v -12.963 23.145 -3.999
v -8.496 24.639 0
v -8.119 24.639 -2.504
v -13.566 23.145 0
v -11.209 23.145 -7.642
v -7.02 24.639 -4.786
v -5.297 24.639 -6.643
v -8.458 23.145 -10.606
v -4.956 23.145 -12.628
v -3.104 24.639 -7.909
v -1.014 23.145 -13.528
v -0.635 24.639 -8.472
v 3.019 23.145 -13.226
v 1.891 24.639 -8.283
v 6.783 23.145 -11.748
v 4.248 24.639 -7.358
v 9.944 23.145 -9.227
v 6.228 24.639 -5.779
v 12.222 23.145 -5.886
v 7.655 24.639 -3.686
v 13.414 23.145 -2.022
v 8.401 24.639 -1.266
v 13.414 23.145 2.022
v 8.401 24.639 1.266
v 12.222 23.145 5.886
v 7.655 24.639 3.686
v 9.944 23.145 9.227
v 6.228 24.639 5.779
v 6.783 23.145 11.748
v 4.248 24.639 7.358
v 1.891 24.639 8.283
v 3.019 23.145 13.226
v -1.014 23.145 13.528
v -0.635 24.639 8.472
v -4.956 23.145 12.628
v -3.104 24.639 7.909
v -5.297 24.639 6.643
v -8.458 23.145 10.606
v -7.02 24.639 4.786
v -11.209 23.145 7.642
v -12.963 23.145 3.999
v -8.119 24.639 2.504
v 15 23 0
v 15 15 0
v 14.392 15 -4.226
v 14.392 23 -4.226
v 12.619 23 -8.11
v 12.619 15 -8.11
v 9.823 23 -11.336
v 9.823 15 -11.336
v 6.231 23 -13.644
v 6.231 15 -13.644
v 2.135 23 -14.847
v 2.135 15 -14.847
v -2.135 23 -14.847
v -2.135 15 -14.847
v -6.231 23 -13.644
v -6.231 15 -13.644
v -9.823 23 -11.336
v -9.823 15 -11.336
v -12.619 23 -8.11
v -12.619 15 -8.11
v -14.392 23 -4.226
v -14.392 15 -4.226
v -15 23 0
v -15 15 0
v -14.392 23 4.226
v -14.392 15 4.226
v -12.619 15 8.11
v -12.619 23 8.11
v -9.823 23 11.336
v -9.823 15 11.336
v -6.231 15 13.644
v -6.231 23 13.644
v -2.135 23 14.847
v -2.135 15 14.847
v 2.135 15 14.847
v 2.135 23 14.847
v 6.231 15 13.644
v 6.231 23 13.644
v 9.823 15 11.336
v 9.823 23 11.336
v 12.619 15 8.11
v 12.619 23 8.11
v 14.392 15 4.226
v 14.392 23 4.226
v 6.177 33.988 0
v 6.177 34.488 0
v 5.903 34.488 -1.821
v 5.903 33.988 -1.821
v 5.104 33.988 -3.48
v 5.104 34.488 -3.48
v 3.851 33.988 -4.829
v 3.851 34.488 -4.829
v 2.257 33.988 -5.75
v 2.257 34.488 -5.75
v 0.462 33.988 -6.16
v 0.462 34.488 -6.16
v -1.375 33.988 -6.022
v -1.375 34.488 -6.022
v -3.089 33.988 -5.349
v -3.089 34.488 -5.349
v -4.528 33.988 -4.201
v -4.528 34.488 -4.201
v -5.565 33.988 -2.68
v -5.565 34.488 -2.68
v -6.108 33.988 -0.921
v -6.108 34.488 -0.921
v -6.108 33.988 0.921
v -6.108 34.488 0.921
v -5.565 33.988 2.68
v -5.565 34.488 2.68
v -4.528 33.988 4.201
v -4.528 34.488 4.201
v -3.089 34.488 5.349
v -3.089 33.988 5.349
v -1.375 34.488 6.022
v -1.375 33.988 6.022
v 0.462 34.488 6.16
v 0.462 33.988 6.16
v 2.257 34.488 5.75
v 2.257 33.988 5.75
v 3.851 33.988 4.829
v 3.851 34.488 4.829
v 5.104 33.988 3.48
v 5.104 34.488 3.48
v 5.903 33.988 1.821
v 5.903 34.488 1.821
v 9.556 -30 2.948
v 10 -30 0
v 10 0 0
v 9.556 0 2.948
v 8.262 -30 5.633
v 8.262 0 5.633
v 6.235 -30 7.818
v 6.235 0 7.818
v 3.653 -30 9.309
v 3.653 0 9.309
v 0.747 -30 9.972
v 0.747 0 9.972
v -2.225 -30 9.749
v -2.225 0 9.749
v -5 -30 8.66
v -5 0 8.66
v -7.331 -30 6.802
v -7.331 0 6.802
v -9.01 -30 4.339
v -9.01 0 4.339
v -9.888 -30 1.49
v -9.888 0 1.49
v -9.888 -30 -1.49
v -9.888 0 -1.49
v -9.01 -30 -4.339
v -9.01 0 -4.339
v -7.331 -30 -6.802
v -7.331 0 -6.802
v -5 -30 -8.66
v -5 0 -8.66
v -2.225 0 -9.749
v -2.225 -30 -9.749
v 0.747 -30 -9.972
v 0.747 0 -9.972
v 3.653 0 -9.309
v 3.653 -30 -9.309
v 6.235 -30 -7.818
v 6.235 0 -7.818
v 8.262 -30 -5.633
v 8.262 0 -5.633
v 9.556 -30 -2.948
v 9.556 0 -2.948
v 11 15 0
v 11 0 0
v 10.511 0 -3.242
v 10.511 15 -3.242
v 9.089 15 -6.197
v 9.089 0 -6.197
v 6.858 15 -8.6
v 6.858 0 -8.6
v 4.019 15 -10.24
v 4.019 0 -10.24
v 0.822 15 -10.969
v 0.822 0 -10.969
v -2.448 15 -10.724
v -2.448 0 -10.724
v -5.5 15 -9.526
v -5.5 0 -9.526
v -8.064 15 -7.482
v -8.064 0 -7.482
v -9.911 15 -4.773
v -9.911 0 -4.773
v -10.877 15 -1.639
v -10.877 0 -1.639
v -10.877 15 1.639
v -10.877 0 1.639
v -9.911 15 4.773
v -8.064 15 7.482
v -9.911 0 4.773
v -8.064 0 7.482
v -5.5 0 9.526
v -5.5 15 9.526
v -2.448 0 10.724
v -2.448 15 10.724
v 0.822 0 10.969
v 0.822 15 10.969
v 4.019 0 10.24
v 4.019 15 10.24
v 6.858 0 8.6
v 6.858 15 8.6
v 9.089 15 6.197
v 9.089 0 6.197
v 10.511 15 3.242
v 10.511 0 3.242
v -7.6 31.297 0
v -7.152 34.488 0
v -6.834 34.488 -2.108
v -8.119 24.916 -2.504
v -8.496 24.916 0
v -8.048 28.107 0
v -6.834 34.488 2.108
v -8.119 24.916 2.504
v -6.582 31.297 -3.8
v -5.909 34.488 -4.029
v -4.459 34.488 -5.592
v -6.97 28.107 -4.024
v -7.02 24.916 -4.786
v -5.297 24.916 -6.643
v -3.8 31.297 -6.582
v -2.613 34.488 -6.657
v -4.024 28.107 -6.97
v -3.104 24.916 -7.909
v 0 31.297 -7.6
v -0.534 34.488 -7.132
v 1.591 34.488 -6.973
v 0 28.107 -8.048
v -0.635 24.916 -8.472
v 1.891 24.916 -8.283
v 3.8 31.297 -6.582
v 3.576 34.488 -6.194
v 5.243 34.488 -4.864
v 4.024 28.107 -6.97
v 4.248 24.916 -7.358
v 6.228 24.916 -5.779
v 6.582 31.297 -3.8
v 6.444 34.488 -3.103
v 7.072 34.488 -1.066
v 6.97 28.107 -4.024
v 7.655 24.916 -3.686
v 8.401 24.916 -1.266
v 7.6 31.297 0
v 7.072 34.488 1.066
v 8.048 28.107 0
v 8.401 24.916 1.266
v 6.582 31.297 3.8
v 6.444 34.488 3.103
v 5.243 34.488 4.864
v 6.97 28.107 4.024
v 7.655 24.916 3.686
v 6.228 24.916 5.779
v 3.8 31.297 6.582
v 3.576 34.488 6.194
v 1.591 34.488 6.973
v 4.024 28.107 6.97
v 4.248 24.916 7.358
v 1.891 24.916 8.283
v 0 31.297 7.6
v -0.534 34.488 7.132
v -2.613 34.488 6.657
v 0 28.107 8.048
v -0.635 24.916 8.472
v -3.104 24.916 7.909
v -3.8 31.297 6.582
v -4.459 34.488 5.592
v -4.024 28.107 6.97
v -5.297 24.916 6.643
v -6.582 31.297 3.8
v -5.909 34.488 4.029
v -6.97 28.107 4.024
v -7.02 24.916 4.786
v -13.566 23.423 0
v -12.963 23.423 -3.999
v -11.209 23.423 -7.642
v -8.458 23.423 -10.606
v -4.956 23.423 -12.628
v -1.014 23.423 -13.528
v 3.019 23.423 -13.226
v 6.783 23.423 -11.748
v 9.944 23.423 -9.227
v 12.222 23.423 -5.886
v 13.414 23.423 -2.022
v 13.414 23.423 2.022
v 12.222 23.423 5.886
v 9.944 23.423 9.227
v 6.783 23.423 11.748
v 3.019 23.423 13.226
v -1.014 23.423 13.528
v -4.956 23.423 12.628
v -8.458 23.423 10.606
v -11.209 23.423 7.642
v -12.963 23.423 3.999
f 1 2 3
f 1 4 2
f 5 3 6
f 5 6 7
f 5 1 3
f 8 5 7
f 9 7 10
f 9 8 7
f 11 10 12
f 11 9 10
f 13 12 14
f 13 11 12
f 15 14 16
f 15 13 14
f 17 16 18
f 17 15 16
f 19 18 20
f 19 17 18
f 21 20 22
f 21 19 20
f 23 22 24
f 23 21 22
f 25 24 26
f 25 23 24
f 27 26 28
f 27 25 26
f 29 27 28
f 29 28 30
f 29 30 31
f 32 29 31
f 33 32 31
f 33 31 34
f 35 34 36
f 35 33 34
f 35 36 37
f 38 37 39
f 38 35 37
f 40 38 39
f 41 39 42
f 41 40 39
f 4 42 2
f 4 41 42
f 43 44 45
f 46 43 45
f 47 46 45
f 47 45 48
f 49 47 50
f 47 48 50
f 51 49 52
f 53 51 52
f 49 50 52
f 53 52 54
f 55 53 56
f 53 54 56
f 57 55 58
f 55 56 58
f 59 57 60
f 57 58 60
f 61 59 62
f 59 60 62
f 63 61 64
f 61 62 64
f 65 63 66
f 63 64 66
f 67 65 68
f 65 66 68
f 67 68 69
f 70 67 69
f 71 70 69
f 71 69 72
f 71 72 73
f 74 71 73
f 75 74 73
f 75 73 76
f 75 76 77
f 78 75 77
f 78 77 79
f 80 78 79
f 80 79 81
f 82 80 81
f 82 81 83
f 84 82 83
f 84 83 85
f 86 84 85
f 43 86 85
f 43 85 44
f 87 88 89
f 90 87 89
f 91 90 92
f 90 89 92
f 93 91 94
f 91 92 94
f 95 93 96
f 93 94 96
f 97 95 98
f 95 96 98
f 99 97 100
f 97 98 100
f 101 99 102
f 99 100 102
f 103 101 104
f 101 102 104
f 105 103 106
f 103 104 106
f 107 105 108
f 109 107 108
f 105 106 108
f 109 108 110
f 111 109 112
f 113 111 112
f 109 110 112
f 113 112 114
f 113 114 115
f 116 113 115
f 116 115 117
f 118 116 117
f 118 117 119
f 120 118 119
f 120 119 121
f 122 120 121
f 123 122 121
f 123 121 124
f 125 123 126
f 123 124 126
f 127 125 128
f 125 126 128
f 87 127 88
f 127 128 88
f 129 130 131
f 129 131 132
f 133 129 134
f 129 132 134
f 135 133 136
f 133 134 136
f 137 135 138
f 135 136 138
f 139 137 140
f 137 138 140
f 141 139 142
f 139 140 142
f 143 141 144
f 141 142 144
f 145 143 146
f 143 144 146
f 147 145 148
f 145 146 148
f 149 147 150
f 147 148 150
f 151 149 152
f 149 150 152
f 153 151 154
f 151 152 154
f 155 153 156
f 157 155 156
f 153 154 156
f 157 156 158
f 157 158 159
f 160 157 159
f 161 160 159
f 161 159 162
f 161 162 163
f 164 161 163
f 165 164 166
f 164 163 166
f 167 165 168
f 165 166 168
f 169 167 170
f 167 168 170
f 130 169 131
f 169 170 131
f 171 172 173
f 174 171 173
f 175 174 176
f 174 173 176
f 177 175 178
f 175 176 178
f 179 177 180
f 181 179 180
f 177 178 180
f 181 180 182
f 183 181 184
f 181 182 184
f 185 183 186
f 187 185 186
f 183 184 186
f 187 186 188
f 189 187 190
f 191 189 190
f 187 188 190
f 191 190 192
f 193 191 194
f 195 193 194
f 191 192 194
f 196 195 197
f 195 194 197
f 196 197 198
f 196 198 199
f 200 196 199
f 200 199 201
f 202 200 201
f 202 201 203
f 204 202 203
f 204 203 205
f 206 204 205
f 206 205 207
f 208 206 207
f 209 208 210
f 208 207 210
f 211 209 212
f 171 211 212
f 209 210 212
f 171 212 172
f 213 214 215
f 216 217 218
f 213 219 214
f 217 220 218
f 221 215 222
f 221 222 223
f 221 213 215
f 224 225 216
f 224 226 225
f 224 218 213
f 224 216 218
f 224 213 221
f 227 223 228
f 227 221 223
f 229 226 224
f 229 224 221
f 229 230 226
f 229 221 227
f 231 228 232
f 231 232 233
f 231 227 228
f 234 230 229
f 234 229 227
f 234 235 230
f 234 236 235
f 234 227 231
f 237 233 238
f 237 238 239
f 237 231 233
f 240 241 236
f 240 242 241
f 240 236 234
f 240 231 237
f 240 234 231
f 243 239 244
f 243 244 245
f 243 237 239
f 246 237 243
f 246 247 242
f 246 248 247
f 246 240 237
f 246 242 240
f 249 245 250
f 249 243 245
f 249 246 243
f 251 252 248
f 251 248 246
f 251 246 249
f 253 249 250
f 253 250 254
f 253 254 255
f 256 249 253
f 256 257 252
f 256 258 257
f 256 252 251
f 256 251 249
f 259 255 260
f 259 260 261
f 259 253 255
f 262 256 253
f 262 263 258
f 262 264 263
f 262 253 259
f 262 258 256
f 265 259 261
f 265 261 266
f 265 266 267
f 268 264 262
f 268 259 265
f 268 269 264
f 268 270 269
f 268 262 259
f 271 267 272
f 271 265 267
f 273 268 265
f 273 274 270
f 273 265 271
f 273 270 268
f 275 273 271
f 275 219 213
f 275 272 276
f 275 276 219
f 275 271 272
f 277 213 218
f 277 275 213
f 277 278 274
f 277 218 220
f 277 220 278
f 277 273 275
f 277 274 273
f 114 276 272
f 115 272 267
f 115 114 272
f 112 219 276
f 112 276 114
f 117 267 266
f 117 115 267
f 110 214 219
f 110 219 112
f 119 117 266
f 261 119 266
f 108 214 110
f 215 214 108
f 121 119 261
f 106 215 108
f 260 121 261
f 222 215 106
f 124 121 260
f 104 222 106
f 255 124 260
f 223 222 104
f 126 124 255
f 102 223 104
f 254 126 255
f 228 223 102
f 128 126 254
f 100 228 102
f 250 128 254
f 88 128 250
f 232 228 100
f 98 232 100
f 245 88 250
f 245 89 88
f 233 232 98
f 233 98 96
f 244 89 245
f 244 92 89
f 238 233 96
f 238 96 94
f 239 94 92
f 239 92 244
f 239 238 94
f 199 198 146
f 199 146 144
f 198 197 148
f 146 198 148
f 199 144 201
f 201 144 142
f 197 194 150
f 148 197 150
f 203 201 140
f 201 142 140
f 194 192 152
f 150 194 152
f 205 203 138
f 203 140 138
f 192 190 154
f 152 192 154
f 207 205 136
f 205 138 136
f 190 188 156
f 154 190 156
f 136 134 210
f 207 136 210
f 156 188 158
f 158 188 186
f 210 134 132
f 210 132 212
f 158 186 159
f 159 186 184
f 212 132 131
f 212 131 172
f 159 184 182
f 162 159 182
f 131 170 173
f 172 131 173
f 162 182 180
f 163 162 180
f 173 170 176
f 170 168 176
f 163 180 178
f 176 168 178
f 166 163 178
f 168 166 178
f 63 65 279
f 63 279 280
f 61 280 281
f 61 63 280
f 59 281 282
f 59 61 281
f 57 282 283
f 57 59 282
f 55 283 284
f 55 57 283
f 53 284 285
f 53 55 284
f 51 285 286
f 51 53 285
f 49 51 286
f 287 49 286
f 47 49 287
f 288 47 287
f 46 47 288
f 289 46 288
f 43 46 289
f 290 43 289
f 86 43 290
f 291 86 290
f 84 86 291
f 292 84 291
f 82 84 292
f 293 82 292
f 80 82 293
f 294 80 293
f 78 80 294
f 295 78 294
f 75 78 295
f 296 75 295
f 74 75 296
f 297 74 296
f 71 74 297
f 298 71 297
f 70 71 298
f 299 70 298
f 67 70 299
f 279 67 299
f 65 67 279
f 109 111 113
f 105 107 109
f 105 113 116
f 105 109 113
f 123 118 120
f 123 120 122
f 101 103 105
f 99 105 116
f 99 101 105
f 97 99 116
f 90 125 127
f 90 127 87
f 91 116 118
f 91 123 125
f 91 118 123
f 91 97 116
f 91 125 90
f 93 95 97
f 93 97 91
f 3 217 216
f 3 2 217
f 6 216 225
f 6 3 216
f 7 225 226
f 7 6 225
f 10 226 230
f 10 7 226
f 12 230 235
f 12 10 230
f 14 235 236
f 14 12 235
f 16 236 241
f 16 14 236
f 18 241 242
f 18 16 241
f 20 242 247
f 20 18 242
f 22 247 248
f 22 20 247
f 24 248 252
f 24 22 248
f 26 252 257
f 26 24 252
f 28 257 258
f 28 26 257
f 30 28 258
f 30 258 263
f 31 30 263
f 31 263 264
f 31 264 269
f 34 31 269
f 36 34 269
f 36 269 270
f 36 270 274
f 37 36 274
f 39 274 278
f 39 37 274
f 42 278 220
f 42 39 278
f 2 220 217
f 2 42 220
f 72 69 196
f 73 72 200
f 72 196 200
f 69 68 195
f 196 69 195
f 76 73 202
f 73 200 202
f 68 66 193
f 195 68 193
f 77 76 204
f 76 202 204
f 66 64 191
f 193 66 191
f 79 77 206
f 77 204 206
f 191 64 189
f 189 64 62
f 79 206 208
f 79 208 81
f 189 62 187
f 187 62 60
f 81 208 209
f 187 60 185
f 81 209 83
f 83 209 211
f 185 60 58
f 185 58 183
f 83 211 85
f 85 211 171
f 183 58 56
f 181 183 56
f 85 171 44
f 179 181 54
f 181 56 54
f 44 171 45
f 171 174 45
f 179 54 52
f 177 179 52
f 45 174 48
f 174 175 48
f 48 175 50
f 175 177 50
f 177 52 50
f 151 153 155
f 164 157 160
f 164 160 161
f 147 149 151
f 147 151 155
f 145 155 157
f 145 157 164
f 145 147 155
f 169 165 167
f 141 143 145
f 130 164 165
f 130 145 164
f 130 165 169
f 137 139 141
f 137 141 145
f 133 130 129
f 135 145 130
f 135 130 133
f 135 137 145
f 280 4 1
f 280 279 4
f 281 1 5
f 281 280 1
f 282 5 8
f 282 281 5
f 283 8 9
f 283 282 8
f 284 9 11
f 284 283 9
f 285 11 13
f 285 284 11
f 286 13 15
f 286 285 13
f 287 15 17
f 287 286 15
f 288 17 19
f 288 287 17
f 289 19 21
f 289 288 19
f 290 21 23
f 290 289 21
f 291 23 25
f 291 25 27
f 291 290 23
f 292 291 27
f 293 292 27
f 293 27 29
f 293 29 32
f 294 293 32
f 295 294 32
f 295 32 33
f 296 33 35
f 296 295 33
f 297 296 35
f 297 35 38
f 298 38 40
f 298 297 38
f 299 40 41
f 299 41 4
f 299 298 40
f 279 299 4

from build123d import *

# Parameters (mm, degrees)
SKETCH1_R           = 11
BOSS_EXTRUDE1_DEPTH = 15
SKETCH2_R           = 15
BOSS_EXTRUDE2_DEPTH = 8
SKETCH4_R           = 6.177060042
CUT_EXTRUDE1_DEPTH  = 0.5
SKETCH5_R           = 10
BOSS_EXTRUDE3_DEPTH = 30


with BuildPart() as part:
    # Sketch1 → Boss-Extrude1 (new body)
    with BuildSketch(Plane(origin=(0, 0, 0), x_dir=(1, 0, 0), z_dir=(0, 1, 0))):
        Circle(SKETCH1_R)
    extrude(amount=BOSS_EXTRUDE1_DEPTH)

    # Sketch2 → Boss-Extrude2 (add)
    with BuildSketch(Plane(origin=(0, 15, 0), x_dir=(1, 0, 0), z_dir=(0, 1, 0))):
        Circle(SKETCH2_R)
    extrude(amount=BOSS_EXTRUDE2_DEPTH)

    # Sketch3 → Revolve1 (revolve)
    with BuildSketch(Plane.XY):
        Polygon((-13.565724674, 23.42261725), (-15, 23), (0, 23), (0, 34.488010938), (-7.151825625, 34.488010938), (-8.49615375, 24.916394688), (-8.49615375, 24.638921263), (-13.565724674, 23.145143825), align=None)
    revolve(axis=Axis((0, 31.369169688, 0), (0, -1, 0)))

    # Sketch4 → Cut-Extrude1 (cut)
    with BuildSketch(Plane(origin=(0, 34.488010938, 0), x_dir=(1, 0, 0), z_dir=(0, 1, 0))):
        Circle(SKETCH4_R)
    extrude(amount=-CUT_EXTRUDE1_DEPTH, mode=Mode.SUBTRACT)

    # Sketch5 → Boss-Extrude3 (add)
    with BuildSketch(Plane.XZ):
        Circle(SKETCH5_R)
    extrude(amount=BOSS_EXTRUDE3_DEPTH)


solid = part.part
